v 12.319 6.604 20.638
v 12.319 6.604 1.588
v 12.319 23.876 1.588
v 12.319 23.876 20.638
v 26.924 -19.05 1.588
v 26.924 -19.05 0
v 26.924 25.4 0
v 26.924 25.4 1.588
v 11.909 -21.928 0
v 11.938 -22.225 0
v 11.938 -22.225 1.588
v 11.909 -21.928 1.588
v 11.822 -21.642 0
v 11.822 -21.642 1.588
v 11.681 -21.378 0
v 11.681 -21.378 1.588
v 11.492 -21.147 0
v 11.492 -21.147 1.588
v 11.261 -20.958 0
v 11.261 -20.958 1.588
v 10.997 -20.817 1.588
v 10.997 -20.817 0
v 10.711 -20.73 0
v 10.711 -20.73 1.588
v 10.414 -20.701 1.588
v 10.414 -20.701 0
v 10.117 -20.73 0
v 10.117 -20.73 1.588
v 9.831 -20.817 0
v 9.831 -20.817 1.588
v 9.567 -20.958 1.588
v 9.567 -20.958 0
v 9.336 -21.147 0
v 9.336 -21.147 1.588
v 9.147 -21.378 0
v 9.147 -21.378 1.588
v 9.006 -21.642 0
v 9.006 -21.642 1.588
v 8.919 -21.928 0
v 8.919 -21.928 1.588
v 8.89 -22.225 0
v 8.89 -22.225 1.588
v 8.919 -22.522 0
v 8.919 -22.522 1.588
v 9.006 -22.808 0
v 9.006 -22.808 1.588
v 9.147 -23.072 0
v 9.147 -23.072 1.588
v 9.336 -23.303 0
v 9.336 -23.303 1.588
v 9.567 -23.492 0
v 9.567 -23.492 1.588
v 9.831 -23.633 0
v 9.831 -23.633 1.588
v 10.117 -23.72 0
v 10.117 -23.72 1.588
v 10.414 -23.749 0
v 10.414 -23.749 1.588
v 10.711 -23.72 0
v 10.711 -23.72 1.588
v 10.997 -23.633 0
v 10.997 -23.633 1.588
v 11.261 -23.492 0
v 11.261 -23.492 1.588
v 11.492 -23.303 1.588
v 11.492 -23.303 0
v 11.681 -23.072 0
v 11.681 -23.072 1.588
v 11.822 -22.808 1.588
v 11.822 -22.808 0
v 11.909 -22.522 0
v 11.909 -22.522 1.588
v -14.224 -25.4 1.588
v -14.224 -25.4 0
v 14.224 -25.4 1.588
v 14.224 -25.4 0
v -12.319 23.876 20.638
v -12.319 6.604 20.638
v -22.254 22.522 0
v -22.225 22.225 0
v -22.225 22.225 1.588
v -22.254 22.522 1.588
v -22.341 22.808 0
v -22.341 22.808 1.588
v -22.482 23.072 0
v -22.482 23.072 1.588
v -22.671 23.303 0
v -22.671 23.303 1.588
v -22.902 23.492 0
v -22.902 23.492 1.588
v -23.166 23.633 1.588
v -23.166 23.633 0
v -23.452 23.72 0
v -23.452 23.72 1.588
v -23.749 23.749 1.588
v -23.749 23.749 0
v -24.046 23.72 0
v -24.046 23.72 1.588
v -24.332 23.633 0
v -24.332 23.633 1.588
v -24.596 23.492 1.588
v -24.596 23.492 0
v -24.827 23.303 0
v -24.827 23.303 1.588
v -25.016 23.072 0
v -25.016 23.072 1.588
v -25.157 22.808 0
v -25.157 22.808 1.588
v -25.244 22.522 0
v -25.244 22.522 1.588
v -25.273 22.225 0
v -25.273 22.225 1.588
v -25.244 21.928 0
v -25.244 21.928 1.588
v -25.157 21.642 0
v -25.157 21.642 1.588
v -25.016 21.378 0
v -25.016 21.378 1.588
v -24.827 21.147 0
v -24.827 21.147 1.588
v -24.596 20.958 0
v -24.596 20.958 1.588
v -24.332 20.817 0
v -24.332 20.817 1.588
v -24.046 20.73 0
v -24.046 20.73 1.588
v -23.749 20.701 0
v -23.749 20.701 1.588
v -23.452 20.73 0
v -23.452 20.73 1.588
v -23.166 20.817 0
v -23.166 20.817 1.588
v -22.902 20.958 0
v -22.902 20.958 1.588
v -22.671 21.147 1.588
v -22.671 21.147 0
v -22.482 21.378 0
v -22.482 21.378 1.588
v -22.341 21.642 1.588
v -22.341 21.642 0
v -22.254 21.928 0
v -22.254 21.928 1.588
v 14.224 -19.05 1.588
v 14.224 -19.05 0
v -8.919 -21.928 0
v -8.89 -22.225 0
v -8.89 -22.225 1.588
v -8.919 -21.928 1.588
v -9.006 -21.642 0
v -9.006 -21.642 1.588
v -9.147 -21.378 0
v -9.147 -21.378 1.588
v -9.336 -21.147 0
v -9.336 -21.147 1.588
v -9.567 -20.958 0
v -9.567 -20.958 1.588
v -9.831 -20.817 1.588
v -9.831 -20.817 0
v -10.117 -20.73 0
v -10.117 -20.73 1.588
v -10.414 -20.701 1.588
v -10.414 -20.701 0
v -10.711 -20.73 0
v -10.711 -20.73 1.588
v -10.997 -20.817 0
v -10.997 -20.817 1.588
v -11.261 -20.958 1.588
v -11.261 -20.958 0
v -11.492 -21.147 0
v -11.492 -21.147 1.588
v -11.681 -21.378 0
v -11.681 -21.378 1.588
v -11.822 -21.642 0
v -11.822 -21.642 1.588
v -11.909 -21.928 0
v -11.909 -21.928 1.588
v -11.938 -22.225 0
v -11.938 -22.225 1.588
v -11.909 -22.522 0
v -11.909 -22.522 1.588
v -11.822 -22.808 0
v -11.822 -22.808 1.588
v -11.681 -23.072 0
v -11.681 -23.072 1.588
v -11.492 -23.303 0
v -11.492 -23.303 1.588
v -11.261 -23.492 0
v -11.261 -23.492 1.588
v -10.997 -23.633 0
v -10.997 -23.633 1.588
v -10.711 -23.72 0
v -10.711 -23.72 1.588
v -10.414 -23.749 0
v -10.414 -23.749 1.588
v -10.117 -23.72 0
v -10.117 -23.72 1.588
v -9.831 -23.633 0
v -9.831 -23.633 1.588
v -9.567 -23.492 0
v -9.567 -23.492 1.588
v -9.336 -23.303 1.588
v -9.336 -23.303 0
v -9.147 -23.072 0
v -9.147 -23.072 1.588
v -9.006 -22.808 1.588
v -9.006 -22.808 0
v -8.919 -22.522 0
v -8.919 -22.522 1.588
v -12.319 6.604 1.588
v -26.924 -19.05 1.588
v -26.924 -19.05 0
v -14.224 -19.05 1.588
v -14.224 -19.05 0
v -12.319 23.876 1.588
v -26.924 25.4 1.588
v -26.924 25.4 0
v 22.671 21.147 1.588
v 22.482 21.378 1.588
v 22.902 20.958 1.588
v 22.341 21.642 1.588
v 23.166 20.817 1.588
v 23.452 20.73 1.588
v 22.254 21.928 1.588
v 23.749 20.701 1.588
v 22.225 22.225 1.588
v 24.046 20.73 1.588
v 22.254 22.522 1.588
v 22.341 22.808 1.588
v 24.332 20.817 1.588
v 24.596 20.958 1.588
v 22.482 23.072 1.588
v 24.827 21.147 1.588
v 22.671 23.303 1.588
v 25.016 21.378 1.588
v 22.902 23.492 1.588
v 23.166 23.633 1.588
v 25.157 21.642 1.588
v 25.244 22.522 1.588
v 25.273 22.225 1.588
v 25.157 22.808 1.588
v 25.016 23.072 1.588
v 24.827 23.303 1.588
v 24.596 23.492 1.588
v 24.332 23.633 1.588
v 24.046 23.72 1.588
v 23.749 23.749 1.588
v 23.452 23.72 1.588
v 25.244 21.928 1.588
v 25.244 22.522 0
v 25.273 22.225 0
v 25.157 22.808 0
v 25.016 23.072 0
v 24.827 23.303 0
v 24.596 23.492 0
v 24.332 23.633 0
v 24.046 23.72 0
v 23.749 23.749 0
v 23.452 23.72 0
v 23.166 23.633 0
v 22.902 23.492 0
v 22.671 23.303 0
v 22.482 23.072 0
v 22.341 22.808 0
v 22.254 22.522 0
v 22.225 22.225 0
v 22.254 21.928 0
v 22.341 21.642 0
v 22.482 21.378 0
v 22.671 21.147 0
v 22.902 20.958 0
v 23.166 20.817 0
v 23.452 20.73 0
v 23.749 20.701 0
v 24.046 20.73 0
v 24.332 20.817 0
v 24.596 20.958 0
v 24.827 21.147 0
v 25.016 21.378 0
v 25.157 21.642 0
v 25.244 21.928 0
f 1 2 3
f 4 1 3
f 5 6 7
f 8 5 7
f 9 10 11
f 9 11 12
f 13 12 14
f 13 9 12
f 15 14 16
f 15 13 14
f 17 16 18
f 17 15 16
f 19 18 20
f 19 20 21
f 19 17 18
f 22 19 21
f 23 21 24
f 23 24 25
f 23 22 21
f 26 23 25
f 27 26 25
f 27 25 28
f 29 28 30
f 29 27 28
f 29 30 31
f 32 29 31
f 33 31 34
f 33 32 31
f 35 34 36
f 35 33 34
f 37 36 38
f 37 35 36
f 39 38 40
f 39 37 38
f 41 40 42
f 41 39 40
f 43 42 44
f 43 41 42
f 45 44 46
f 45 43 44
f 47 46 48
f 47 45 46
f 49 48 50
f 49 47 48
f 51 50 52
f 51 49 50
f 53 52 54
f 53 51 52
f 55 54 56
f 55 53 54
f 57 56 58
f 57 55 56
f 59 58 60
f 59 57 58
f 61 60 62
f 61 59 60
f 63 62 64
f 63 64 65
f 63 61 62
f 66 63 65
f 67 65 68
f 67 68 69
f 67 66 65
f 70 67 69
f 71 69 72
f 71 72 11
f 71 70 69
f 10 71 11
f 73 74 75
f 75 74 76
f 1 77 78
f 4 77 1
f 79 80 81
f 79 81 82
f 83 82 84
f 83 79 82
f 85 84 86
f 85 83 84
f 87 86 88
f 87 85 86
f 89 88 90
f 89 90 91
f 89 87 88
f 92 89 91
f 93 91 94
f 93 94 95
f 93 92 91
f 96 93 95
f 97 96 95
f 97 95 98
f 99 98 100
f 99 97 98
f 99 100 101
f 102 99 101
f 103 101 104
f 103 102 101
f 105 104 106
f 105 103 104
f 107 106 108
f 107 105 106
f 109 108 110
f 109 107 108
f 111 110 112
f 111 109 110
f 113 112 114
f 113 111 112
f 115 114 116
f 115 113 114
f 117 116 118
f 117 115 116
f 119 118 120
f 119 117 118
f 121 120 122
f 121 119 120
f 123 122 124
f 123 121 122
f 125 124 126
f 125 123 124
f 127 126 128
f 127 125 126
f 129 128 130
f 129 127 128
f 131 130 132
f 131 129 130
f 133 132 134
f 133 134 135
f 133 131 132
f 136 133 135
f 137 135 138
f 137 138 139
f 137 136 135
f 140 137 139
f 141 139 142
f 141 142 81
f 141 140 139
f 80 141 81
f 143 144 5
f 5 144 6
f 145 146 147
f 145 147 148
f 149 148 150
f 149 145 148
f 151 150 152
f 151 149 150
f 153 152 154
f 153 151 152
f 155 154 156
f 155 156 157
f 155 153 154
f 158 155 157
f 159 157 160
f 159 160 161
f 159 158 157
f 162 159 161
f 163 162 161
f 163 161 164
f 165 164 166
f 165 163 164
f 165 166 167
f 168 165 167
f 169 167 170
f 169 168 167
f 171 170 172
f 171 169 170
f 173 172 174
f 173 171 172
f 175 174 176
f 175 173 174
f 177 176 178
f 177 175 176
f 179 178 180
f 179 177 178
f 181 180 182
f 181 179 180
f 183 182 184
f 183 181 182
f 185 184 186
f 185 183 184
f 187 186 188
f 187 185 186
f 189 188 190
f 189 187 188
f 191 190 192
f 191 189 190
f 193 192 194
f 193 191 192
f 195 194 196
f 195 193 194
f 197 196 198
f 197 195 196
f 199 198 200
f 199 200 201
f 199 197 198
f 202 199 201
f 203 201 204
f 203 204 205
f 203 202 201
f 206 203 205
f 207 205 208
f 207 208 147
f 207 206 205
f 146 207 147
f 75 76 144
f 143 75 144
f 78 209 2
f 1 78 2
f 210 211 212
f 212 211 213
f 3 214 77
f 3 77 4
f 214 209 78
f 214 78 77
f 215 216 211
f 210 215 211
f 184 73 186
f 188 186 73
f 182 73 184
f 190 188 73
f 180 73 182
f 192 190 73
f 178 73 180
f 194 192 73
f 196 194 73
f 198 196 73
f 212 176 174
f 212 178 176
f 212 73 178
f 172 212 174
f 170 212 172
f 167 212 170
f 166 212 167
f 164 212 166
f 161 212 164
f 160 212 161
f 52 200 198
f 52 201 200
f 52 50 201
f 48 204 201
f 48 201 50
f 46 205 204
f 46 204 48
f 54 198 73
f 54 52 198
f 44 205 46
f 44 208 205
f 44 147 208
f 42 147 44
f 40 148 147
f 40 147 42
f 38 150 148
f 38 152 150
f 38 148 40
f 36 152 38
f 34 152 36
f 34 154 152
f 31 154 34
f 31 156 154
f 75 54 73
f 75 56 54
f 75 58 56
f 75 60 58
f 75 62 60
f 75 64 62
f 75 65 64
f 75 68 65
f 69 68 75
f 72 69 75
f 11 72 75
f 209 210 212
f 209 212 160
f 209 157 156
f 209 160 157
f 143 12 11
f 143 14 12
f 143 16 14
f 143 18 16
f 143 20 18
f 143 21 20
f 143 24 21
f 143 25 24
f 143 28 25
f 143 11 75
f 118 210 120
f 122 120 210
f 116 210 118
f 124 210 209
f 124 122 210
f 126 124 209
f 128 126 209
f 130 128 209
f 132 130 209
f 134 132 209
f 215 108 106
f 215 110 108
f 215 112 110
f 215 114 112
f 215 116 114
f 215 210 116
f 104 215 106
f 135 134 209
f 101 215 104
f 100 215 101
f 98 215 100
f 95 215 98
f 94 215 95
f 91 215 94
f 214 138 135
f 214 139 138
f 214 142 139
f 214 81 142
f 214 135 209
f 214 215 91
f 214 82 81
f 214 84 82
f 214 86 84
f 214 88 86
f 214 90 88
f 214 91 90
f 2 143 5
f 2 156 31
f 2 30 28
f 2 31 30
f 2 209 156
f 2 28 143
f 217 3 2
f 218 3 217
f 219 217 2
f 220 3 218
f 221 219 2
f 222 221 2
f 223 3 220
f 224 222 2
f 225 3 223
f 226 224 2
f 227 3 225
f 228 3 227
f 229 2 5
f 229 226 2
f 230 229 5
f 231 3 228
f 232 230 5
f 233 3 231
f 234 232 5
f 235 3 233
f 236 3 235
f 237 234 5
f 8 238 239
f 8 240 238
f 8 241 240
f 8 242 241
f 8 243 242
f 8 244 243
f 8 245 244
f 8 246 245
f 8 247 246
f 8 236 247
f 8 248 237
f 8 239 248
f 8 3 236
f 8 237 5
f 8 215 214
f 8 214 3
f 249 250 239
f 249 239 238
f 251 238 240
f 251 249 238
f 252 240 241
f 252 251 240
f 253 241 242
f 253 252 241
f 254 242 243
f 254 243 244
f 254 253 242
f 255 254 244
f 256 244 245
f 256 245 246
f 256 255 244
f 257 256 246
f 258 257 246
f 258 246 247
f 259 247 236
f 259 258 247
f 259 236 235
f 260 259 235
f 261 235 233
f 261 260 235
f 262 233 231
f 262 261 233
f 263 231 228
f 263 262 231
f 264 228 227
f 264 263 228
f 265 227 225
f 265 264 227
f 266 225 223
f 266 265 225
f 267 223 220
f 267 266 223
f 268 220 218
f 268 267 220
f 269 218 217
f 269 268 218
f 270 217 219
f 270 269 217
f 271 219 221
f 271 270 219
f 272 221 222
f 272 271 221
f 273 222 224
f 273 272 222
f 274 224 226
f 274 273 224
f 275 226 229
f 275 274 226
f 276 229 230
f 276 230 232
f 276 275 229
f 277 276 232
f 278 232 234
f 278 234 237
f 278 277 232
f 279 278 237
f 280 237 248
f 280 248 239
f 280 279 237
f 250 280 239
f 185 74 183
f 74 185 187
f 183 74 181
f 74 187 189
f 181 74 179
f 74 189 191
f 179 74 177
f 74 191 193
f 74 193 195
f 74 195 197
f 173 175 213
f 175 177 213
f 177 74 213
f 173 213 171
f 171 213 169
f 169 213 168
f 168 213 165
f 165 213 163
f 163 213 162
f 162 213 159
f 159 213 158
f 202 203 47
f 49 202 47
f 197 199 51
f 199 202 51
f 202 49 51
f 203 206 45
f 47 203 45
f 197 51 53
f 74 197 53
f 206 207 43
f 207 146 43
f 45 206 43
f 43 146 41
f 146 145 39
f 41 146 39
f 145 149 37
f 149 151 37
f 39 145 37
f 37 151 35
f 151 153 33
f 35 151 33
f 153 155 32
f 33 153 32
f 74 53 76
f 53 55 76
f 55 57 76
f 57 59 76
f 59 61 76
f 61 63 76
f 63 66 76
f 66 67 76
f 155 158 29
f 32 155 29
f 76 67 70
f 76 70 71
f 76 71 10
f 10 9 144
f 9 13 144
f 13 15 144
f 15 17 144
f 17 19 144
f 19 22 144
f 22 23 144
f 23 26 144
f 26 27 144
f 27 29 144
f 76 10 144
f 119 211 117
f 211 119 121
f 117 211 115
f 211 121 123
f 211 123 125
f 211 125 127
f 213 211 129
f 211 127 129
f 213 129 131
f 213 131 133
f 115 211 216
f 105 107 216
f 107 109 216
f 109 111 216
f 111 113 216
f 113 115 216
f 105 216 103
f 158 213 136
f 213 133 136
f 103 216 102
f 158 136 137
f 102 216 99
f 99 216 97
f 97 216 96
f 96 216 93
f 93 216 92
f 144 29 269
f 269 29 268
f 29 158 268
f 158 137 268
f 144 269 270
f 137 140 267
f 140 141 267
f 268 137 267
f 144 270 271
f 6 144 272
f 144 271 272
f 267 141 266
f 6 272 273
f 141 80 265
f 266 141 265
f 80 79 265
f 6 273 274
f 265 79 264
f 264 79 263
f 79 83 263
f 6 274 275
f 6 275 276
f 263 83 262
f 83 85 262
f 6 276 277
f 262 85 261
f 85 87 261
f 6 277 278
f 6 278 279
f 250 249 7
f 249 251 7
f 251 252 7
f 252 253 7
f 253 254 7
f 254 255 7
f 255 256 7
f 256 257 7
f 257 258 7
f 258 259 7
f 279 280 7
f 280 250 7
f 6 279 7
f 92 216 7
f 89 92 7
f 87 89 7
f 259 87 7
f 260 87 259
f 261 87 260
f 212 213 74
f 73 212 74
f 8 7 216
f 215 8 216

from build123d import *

# Parameters (mm, degrees)
SKETCH1_R           = 1.524
BOSS_EXTRUDE1_DEPTH = 1.5875
SKETCH2_W           = 24.638
SKETCH2_H           = 17.272
BOSS_EXTRUDE2_DEPTH = 19.05


with BuildPart() as part:
    # Sketch1 → Boss-Extrude1 (new body)
    with BuildSketch(Plane.XY):
        Polygon((-26.924, 25.4), (-26.924, -19.05), (-14.224, -19.05), (-14.224, -25.4), (14.224, -25.4), (14.224, -19.05), (26.924, -19.05), (26.924, 25.4), align=None)
        with Locations((-10.414, -22.225)):
            Circle(SKETCH1_R, mode=Mode.SUBTRACT)
        with Locations((10.414, -22.225)):
            Circle(SKETCH1_R, mode=Mode.SUBTRACT)
        with Locations((-23.749, 22.225)):
            Circle(SKETCH1_R, mode=Mode.SUBTRACT)
        with Locations((23.749, 22.225)):
            Circle(SKETCH1_R, mode=Mode.SUBTRACT)
    extrude(amount=BOSS_EXTRUDE1_DEPTH)

    # Sketch2 → Boss-Extrude2 (add)
    with BuildSketch(Plane.XY.offset(1.5875)):
        with Locations((0, 15.24)):
            Rectangle(SKETCH2_W, SKETCH2_H)
    extrude(amount=BOSS_EXTRUDE2_DEPTH)


solid = part.part
